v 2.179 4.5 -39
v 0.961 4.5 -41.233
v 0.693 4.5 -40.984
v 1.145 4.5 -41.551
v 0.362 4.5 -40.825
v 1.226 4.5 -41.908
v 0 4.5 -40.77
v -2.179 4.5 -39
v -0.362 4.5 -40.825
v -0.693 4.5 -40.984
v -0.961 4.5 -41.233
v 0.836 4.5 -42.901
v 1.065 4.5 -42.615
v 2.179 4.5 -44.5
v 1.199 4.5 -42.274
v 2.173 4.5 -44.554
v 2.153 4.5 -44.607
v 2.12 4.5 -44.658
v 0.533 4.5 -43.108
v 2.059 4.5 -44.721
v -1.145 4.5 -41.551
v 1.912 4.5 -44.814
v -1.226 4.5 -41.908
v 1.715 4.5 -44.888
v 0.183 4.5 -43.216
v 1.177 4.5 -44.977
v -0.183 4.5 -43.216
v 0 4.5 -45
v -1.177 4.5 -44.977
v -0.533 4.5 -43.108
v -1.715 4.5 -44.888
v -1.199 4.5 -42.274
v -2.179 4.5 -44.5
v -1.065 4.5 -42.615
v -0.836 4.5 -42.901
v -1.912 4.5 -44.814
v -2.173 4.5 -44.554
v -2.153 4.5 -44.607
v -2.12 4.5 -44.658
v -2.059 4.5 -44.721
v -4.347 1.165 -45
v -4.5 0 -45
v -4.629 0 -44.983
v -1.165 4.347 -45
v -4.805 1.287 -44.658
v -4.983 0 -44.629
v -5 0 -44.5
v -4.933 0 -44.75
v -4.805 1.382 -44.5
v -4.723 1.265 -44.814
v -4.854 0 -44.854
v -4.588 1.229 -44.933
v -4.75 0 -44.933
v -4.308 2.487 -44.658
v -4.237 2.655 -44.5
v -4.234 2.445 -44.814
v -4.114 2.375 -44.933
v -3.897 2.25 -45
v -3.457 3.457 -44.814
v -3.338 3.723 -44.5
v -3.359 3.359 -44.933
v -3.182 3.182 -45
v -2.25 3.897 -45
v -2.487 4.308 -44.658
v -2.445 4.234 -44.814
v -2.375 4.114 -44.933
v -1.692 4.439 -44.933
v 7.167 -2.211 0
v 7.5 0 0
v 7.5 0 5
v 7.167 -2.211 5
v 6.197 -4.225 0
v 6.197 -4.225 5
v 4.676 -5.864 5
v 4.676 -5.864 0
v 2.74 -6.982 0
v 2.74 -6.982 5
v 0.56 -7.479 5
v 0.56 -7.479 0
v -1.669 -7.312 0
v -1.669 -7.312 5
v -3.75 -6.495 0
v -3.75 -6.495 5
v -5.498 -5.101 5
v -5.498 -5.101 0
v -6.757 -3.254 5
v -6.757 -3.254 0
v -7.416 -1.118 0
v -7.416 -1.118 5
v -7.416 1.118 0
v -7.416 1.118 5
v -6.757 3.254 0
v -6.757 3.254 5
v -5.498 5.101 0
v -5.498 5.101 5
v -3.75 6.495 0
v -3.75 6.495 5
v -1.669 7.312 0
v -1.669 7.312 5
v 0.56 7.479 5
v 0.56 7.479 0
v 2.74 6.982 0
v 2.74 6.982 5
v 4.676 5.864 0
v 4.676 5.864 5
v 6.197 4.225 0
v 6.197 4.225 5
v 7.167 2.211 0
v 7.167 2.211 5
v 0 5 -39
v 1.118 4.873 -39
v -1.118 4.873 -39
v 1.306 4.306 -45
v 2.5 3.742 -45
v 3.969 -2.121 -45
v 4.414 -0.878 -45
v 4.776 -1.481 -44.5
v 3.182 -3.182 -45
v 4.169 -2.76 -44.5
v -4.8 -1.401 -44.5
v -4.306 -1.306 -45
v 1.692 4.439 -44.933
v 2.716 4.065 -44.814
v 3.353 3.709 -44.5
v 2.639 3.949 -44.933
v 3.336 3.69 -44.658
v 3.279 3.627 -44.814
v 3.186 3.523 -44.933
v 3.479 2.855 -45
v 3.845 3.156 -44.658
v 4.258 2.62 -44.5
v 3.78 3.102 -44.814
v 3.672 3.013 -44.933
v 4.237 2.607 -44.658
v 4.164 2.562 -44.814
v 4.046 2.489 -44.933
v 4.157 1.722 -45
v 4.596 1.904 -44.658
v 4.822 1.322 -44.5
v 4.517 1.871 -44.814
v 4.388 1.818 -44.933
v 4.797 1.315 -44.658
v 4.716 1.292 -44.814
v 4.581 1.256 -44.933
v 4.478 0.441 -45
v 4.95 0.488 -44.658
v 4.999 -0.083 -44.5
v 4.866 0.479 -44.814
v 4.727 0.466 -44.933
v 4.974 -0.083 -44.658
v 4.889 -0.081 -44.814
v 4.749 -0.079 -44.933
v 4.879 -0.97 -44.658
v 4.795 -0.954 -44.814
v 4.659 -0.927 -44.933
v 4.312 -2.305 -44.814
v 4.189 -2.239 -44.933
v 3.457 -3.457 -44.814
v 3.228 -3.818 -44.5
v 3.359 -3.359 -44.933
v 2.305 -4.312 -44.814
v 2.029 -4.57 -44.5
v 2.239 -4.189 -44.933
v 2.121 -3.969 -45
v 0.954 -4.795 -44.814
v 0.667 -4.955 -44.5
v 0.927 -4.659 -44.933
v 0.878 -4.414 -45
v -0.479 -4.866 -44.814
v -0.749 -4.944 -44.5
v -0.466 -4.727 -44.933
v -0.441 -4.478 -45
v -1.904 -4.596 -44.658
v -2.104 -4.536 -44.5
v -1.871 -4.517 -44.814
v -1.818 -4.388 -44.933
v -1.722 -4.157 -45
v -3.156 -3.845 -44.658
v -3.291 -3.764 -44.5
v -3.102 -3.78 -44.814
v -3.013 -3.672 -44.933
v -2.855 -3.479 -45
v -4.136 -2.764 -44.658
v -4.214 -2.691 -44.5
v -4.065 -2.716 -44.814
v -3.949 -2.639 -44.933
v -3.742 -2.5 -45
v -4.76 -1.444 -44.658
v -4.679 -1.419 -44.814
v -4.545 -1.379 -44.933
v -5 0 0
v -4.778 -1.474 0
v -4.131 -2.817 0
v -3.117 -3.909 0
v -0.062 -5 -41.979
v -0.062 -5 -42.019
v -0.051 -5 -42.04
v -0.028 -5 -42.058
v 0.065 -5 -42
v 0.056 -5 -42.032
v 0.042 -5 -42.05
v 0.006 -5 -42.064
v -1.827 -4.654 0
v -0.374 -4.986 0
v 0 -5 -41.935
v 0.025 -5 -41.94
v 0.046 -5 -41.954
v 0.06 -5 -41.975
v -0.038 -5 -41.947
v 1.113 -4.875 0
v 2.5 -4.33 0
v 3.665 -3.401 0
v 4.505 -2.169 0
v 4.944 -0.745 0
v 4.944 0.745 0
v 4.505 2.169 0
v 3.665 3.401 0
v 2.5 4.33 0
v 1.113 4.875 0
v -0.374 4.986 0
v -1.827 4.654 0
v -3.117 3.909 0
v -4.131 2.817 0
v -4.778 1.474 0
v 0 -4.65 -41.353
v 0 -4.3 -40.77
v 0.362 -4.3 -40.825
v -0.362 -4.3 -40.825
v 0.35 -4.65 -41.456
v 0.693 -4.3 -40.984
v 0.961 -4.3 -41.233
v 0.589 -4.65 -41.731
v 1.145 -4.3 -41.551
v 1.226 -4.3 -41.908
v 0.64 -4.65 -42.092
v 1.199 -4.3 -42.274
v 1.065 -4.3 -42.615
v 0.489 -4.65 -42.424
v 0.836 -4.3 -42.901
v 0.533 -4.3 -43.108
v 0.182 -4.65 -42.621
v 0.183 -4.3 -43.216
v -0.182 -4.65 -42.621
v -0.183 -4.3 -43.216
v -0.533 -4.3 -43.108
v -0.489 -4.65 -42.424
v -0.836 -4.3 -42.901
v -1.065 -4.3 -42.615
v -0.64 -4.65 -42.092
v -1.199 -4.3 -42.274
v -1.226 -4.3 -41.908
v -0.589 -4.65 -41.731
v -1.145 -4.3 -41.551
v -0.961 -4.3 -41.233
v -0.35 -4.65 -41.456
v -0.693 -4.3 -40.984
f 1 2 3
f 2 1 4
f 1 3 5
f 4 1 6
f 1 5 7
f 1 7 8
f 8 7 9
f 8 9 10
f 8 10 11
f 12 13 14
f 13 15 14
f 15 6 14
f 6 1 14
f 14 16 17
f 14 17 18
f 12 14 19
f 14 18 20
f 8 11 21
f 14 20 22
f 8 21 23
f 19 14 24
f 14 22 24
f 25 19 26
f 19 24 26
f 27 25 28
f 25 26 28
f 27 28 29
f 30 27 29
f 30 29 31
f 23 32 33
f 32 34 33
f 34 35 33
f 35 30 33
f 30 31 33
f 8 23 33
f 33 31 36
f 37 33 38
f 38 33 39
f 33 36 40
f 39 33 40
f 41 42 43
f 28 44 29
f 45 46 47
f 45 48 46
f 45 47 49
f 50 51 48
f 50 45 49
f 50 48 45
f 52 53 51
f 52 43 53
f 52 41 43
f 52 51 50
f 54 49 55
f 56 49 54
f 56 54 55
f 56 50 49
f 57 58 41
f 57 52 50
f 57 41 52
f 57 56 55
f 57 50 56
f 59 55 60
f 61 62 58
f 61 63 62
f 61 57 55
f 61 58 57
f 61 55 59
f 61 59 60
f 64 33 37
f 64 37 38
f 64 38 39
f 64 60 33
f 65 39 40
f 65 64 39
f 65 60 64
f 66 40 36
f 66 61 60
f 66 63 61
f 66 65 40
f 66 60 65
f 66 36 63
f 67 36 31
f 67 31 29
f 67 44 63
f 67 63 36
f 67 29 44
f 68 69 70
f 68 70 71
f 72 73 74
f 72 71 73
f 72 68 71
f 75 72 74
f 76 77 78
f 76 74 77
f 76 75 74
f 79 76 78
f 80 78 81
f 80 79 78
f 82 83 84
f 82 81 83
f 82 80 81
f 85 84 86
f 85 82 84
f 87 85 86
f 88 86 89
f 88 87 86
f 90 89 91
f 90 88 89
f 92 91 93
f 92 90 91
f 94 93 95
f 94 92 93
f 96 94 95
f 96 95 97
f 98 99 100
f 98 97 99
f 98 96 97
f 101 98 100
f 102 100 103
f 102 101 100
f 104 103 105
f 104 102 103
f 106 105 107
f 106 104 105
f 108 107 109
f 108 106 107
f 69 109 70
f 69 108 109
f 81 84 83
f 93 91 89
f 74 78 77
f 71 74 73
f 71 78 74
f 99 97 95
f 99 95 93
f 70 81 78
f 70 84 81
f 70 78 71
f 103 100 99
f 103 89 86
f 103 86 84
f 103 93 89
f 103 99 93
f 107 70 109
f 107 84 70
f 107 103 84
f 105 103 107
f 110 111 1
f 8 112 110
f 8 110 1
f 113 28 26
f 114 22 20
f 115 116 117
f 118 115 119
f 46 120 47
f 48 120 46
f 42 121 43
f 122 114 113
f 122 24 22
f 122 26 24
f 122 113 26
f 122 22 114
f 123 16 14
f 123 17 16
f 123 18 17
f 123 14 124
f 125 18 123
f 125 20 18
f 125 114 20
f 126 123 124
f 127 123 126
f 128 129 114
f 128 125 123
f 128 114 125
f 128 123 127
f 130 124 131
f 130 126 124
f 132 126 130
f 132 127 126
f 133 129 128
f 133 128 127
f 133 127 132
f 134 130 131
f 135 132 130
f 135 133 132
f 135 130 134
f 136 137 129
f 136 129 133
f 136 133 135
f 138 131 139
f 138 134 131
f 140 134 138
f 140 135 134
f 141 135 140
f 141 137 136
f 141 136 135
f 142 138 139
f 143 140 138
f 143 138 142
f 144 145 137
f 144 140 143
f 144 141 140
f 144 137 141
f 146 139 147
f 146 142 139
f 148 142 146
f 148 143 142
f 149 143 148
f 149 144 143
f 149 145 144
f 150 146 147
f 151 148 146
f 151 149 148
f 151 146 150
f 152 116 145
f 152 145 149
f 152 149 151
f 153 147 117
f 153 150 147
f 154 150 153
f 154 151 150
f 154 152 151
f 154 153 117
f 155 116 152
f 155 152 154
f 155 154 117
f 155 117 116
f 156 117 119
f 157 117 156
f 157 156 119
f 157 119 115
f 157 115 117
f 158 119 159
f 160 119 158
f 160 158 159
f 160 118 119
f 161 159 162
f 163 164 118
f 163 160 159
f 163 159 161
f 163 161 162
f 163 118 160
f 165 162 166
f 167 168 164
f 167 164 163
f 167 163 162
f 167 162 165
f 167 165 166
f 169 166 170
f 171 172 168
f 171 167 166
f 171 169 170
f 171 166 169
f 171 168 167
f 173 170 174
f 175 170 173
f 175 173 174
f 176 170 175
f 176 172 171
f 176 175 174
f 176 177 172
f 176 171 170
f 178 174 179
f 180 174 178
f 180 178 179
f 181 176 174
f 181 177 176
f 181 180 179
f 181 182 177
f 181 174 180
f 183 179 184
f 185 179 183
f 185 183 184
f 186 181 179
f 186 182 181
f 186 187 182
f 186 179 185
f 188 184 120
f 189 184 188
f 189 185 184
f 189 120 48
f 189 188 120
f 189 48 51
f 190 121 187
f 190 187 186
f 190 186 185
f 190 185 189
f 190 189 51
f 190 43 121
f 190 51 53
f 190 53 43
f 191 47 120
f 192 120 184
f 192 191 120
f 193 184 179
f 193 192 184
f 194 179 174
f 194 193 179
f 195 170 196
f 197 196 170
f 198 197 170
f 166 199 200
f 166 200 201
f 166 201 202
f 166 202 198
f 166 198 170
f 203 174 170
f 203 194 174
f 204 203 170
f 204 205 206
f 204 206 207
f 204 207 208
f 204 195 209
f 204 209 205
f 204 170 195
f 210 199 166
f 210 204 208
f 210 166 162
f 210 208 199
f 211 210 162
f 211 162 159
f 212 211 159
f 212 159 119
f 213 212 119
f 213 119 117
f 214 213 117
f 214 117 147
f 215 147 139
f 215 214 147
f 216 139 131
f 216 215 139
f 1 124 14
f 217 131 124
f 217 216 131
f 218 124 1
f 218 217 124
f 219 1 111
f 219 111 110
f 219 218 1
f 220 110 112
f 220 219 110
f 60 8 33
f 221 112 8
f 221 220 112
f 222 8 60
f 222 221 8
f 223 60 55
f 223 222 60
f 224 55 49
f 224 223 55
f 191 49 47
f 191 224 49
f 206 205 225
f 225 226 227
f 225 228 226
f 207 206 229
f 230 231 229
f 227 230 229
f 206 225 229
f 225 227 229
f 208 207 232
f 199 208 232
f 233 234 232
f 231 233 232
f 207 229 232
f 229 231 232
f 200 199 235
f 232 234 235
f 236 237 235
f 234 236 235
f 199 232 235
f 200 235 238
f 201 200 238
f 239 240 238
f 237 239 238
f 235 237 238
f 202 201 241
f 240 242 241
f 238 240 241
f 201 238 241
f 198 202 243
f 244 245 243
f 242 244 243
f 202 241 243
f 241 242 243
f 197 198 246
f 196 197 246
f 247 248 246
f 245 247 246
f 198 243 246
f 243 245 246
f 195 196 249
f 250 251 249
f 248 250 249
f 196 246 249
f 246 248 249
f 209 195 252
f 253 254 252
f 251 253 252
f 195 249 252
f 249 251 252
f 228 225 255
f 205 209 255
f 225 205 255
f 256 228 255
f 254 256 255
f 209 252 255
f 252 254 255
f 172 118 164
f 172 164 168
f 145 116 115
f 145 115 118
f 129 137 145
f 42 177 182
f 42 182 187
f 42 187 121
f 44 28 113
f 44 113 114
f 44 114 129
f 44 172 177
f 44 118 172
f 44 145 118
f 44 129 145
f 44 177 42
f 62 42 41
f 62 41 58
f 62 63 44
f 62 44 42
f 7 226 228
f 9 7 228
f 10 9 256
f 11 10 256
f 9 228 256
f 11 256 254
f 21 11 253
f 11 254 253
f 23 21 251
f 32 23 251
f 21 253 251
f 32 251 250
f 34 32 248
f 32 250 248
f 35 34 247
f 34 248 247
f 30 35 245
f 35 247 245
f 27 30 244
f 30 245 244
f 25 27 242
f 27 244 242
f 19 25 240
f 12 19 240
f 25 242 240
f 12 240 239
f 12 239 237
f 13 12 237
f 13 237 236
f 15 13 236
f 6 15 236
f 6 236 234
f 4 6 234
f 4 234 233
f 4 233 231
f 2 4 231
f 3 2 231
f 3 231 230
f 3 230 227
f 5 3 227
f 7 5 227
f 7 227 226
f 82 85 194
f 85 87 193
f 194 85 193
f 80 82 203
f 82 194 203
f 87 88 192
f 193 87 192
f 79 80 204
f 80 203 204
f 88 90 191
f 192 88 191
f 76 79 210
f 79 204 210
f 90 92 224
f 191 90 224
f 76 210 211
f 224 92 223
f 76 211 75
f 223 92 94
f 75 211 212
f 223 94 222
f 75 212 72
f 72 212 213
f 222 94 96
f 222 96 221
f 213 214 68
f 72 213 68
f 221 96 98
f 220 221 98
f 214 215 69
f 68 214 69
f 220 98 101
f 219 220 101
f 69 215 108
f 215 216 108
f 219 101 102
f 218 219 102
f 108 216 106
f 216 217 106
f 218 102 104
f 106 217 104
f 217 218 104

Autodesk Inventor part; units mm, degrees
ref_plane "YZ Plane" through (0, 0, 0) normal (1, 0, 0) x (0, 1, 0)
ref_plane "XZ Plane" through (0, 0, 0) normal (0, 1, 0) x (-1, 0, 0)
ref_plane "XY Plane" through (0, 0, 0) normal (0, 0, 1) x (1, 0, 0)
sketch "Sketch1" plane through (0, 0, 0) normal (0, 0, 1) x (1, 0, 0)
  circle A0 centre (0, 0) radius 7.5
extrude "Extrusion1" add sketch "Sketch1" along normal blind 5
sketch "Sketch2" plane through (0, 0, 0) normal (0, 0, -1) x (-1, 0, 0)
  circle A0 centre (0, 0) radius 5
extrude "Extrusion2" add sketch "Sketch2" along normal blind 45
fillet "Fillet1" radius 0.5 1 edges at (5, 0, -45)
sketch "Sketch3" plane through (0, 0, -45) normal (0, 0, -1) x (-1, 0, 0)
  point P0 (0, 0)
sketch "Sketch4" plane through (0, 0, -45) normal (0, 0, -1) x (-1, 0, 0)
  line L0 (0, 4.5) -> (5, 4.5)
  line L1 (5, 4.5) -> (5, 5.5)
  line L2 (5, 5.5) -> (-5, 5.5)
  line L3 (-5, 5.5) -> (-5, 4.5)
  line L4 (-5, 4.5) -> (0, 4.5)
  circle A0 centre (0, 0) radius 4.5 projected
extrude "Extrusion3" cut sketch "Sketch4" against normal blind 6 contours L4 L3 L2 L1 L0
sketch "Sketch5" plane through (-2.1794, 4.5, -39) normal (0, 1, 0) x (1, 0, 0)
  point P0 (2.1794, -39)
  point P1 (2.1794, 6)
sketch "Sketch6" plane through (-2.1794, 4.5, -39) normal (0, 1, 0) x (1, 0, 0)
  point P0 (2.1794, -39)
sketch "Sketch7" plane through (-2.1794, 4.5, -39) normal (0, 1, 0) x (1, 0, 0)
  point P0 (2.1794, -39)
sketch "Sketch8" plane through (-2.1794, 4.5, -39) normal (0, 1, 0) x (1, 0, 0)
  point P0 (2.1794, -39)
  point P1 (2.1794, -3)
  point P2 (2.1794, -3)
  point P3 (2.1794, 3)
hole "Hole1" at (0, 4.5, -42) direction (0, -1, 0) diameter 2.459 depth 8.8 tip angle 118 thread size "M3x0.5" class "6H" standard "ISO Metric profile"
properties part number "Trzemień"
